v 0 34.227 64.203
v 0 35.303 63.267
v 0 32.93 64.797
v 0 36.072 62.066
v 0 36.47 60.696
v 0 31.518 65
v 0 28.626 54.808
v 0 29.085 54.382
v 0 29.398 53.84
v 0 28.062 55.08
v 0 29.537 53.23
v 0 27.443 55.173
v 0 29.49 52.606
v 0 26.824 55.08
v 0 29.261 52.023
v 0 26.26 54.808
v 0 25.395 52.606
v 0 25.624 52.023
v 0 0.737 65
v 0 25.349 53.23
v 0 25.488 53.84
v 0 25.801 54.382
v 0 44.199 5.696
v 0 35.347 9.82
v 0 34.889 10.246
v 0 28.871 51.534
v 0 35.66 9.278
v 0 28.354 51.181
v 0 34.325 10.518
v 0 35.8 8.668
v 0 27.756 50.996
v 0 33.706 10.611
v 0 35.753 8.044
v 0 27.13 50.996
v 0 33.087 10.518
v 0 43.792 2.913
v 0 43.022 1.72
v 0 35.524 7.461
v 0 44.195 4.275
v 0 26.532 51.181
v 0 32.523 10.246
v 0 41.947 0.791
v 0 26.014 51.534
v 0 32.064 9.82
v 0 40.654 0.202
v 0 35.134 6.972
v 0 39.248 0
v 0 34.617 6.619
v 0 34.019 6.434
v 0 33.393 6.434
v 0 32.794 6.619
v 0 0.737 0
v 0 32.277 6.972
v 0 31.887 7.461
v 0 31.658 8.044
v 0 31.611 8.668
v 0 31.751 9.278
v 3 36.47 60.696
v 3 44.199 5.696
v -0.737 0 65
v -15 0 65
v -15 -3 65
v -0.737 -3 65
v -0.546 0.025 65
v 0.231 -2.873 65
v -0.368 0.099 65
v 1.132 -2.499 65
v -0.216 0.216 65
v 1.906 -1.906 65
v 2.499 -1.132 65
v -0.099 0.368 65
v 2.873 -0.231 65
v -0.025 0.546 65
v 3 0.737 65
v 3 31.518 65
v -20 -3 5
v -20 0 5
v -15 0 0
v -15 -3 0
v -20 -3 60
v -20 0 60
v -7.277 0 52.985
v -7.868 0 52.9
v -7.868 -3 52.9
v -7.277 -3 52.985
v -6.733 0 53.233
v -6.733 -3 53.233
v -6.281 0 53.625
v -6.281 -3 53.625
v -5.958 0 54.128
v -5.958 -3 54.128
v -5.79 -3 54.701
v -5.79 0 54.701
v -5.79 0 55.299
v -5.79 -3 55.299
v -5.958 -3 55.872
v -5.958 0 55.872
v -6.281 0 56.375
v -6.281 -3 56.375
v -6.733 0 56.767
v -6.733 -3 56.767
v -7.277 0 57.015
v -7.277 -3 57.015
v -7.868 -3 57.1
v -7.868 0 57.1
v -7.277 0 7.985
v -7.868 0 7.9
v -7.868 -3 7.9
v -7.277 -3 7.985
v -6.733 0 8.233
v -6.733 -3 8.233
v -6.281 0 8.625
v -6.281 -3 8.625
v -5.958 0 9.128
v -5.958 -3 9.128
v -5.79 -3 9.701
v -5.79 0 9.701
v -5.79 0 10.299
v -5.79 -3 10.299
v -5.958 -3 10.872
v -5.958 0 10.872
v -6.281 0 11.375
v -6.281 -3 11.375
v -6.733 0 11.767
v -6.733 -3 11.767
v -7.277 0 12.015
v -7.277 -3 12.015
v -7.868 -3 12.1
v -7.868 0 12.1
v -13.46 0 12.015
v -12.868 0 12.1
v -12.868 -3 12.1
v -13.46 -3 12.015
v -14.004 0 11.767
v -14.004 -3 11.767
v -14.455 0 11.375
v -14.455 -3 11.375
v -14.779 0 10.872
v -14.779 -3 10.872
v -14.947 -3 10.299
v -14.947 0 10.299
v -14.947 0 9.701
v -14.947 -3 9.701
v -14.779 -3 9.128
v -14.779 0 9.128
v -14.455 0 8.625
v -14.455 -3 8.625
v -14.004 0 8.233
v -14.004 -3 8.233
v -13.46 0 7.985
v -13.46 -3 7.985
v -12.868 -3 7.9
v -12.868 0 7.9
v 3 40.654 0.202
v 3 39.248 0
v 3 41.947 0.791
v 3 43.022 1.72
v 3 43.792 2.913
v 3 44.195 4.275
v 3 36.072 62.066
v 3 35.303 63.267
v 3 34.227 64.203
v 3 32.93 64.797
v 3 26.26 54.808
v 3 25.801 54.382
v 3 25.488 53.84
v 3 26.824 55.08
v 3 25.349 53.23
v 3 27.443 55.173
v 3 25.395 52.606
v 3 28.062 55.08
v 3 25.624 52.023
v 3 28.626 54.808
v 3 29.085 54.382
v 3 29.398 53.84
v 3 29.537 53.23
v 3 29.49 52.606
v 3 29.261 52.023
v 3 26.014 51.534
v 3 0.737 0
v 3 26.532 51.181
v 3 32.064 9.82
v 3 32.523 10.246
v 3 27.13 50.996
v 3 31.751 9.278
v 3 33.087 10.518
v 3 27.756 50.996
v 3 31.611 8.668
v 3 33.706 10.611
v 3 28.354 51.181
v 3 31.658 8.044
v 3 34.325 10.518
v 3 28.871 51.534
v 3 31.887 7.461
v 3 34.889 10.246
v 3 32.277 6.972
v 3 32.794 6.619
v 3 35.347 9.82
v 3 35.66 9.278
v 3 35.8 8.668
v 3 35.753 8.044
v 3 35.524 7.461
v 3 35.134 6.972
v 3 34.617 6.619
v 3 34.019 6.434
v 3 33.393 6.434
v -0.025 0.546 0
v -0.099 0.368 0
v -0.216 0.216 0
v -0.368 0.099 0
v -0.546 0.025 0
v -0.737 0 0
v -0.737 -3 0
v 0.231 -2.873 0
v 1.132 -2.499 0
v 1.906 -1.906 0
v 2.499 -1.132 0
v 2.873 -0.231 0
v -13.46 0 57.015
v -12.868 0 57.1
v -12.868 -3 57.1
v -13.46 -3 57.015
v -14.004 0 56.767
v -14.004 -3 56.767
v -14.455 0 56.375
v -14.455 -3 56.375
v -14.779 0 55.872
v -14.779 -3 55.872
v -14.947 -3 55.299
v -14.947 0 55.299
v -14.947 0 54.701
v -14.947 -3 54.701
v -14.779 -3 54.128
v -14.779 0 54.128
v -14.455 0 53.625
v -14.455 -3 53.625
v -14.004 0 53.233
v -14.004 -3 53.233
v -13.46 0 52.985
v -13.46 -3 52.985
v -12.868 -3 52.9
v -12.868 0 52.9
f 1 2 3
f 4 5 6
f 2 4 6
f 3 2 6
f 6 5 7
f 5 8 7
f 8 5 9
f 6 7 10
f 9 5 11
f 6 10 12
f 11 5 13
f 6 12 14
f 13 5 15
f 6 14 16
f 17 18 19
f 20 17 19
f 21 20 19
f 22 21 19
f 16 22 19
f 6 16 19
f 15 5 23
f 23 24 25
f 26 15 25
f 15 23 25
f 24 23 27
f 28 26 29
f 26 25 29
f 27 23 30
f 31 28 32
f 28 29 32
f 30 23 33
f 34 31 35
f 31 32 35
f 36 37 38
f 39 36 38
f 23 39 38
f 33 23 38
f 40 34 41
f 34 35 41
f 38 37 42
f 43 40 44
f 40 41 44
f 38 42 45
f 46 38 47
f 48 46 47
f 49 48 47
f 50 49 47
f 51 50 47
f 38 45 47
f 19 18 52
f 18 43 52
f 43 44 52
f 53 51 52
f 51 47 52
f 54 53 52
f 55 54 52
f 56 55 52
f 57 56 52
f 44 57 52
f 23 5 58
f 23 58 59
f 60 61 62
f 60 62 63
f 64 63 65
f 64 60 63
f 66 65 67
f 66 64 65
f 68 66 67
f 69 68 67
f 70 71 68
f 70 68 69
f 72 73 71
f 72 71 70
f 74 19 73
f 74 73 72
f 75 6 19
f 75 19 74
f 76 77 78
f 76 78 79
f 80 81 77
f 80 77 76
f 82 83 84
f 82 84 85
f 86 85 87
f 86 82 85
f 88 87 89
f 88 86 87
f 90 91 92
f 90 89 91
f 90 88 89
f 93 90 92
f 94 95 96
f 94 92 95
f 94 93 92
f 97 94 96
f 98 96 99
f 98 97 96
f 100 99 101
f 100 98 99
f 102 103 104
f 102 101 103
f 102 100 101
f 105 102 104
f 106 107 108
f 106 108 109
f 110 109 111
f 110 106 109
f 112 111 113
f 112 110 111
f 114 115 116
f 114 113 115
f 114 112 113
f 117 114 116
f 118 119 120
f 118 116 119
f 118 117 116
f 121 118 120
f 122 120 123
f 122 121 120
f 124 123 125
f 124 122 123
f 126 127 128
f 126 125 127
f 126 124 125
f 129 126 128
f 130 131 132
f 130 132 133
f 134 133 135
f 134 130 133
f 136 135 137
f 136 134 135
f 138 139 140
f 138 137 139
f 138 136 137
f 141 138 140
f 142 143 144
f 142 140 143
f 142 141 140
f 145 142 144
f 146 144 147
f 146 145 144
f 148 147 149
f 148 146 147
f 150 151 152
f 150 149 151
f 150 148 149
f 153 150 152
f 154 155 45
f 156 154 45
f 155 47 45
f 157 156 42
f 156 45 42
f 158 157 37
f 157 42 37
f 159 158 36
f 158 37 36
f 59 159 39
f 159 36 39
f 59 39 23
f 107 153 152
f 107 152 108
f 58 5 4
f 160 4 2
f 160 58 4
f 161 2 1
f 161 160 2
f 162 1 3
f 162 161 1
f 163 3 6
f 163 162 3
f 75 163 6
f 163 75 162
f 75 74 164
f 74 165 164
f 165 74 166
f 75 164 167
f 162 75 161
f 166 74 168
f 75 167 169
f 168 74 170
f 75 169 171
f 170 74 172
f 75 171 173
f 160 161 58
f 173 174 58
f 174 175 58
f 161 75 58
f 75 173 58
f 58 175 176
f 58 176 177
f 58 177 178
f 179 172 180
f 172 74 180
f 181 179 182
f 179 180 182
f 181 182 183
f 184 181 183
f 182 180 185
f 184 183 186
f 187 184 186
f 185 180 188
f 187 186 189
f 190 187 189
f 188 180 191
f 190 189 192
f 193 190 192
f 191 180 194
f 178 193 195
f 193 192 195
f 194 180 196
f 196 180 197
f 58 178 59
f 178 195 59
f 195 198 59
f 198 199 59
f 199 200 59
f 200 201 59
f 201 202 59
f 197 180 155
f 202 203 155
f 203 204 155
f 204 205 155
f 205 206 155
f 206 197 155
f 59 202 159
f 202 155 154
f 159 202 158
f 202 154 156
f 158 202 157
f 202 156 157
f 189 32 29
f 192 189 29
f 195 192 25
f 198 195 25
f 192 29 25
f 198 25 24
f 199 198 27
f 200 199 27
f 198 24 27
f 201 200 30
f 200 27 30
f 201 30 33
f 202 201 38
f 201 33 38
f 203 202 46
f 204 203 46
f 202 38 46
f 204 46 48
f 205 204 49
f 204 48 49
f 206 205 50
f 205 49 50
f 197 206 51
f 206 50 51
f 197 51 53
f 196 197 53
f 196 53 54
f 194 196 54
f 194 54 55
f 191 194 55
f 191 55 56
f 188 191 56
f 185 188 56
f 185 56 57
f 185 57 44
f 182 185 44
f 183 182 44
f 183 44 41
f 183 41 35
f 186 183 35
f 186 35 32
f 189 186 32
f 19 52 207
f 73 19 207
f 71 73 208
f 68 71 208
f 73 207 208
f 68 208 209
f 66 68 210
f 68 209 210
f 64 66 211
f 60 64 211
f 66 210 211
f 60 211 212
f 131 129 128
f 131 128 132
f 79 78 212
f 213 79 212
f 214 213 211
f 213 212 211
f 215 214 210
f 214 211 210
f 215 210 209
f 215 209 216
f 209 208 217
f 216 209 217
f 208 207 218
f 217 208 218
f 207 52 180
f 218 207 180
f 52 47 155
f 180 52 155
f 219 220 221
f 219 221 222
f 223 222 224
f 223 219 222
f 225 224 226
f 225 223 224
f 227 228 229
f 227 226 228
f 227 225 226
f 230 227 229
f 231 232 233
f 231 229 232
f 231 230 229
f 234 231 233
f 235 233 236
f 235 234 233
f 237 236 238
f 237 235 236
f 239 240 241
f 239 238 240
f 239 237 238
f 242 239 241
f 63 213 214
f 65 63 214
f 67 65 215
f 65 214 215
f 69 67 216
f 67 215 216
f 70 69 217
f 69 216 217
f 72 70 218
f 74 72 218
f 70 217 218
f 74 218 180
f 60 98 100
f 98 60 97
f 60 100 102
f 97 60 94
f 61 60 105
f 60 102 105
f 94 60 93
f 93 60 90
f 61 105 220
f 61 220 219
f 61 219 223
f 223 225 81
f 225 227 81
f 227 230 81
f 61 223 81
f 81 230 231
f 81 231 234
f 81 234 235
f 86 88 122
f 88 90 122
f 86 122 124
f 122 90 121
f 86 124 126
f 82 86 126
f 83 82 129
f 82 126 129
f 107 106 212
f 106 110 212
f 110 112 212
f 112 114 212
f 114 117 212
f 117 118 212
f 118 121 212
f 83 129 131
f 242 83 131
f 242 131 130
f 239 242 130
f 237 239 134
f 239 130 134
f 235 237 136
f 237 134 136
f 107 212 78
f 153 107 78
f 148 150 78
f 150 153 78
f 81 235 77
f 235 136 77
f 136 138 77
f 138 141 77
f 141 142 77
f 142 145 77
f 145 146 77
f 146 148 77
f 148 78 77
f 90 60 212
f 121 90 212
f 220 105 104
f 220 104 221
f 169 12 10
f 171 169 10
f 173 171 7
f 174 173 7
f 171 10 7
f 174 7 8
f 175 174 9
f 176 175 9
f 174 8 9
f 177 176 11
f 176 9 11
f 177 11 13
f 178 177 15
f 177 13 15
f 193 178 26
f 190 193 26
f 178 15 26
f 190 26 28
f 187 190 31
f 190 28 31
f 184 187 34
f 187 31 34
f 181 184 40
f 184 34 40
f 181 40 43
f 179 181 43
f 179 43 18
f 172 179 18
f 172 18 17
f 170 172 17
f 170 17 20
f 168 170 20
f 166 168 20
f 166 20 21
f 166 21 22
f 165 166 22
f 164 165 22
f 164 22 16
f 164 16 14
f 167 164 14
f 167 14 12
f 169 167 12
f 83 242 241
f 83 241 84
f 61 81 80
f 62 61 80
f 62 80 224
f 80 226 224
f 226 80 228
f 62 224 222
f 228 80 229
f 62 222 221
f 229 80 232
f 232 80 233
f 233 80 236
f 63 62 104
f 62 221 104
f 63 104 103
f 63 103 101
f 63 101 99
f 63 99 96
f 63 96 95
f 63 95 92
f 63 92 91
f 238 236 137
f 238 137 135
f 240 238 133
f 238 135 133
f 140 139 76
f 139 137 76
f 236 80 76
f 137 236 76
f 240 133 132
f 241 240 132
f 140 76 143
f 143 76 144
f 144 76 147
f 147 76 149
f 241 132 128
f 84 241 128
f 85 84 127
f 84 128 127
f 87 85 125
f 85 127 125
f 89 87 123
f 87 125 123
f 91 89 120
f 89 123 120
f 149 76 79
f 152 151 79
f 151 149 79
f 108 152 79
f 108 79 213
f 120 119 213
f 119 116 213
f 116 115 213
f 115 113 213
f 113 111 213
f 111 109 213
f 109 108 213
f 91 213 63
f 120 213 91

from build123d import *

# Parameters (mm, degrees)
SM_BASE_FLANGE_1_DEPTH = 65
CUT_EXTRUDE_1_DEPTH    = 82.547532152
PATTERN_LINEAR_1_COUNT = 2
PATTERN_LINEAR_1_PITCH = 45
CHAMFER_1_SIZE         = 5
CUT_EXTRUDE_2_DEPTH    = 82.547532152
SKETCH_8_R             = 2.1
CUT_EXTRUDE_3_DEPTH    = 82.547532152
PATTERN_LINEAR_2_COUNT = 2
PATTERN_LINEAR_2_PITCH = 45
FILLET_1_R             = 5


# Sheet-metal steps are written as plain solids
with BuildPart() as part:
    # Sketch 1 → 基材-凸緣1 (new body)
    with BuildSketch(Plane.XY):
        with BuildLine():
            Line((0, 45), (0, 0.7366))
            ThreePointArc((0, 0.7366), (-0.215745145, 0.215745145), (-0.7366, 0))
            Line((-0.7366, 0), (-20, 0))
            Line((-20, 0), (-20, -3))
            Line((-20, -3), (-0.7366, -3))
            ThreePointArc((-0.7366, -3), (1.905575199, -1.905575199), (3, 0.7366))
            Line((3, 0.7366), (3, 45))
            Line((3, 45), (0, 45))
        make_face()
    extrude(amount=SM_BASE_FLANGE_1_DEPTH)

    # 草圖6 → 除料-伸長1 (cut, through all)
    with BuildSketch(Plane(origin=(0, 0, 0), x_dir=(-1, 0, 0), z_dir=(0, 1, 0))):
        with BuildLine():
            Line((7.8683, 57.1), (12.8683, 57.1))
            ThreePointArc((12.8683, 57.1), (14.9683, 55), (12.8683, 52.9))
            Line((12.8683, 52.9), (7.8683, 52.9))
            ThreePointArc((7.8683, 52.9), (5.7683, 55), (7.8683, 57.1))
        make_face()
    cut_extrude_1 = extrude(amount=-CUT_EXTRUDE_1_DEPTH, mode=Mode.SUBTRACT)

    # 直線複製排列1: 除料-伸長1 ×2
    with Locations(*[(0, 0, -i * PATTERN_LINEAR_1_PITCH) for i in range(1, PATTERN_LINEAR_1_COUNT)]):
        add(cut_extrude_1, mode=Mode.SUBTRACT)

    # 導角1
    chamfer_1_edges = [part.edges().sort_by_distance(p)[0] for p in [
        (-20, -1.5, 65),
        (-20, -1.5, 0),
    ]]
    chamfer(chamfer_1_edges, length=CHAMFER_1_SIZE)

    # 草圖7 → 除料-伸長2 (cut, through all)
    with BuildSketch(Plane.ZY):
        Polygon((0, 45), (65, 45), (65, 35.864845744), align=None)
    extrude(amount=-CUT_EXTRUDE_2_DEPTH, mode=Mode.SUBTRACT)

    # 草圖8 → 除料-伸長3 (cut, through all)
    with BuildSketch(Plane.ZY):
        with Locations((8.510949678, 33.705588303)):
            Circle(SKETCH_8_R)
    cut_extrude_3 = extrude(amount=-CUT_EXTRUDE_3_DEPTH, mode=Mode.SUBTRACT)

    # 直線複製排列2: 除料-伸長3 ×2
    with Locations(*[Vector(0, -0.13917310096005842, 0.9902680687415713) * (i * PATTERN_LINEAR_2_PITCH) for i in range(1, PATTERN_LINEAR_2_COUNT)]):
        add(cut_extrude_3, mode=Mode.SUBTRACT)

    # 圓角1
    fillet_1_edges = [part.edges().sort_by_distance(p)[0] for p in [
        (1.5, 35.864845744, 65),
        (1.5, 45, 0),
    ]]
    fillet(fillet_1_edges, radius=FILLET_1_R)


solid = part.part
